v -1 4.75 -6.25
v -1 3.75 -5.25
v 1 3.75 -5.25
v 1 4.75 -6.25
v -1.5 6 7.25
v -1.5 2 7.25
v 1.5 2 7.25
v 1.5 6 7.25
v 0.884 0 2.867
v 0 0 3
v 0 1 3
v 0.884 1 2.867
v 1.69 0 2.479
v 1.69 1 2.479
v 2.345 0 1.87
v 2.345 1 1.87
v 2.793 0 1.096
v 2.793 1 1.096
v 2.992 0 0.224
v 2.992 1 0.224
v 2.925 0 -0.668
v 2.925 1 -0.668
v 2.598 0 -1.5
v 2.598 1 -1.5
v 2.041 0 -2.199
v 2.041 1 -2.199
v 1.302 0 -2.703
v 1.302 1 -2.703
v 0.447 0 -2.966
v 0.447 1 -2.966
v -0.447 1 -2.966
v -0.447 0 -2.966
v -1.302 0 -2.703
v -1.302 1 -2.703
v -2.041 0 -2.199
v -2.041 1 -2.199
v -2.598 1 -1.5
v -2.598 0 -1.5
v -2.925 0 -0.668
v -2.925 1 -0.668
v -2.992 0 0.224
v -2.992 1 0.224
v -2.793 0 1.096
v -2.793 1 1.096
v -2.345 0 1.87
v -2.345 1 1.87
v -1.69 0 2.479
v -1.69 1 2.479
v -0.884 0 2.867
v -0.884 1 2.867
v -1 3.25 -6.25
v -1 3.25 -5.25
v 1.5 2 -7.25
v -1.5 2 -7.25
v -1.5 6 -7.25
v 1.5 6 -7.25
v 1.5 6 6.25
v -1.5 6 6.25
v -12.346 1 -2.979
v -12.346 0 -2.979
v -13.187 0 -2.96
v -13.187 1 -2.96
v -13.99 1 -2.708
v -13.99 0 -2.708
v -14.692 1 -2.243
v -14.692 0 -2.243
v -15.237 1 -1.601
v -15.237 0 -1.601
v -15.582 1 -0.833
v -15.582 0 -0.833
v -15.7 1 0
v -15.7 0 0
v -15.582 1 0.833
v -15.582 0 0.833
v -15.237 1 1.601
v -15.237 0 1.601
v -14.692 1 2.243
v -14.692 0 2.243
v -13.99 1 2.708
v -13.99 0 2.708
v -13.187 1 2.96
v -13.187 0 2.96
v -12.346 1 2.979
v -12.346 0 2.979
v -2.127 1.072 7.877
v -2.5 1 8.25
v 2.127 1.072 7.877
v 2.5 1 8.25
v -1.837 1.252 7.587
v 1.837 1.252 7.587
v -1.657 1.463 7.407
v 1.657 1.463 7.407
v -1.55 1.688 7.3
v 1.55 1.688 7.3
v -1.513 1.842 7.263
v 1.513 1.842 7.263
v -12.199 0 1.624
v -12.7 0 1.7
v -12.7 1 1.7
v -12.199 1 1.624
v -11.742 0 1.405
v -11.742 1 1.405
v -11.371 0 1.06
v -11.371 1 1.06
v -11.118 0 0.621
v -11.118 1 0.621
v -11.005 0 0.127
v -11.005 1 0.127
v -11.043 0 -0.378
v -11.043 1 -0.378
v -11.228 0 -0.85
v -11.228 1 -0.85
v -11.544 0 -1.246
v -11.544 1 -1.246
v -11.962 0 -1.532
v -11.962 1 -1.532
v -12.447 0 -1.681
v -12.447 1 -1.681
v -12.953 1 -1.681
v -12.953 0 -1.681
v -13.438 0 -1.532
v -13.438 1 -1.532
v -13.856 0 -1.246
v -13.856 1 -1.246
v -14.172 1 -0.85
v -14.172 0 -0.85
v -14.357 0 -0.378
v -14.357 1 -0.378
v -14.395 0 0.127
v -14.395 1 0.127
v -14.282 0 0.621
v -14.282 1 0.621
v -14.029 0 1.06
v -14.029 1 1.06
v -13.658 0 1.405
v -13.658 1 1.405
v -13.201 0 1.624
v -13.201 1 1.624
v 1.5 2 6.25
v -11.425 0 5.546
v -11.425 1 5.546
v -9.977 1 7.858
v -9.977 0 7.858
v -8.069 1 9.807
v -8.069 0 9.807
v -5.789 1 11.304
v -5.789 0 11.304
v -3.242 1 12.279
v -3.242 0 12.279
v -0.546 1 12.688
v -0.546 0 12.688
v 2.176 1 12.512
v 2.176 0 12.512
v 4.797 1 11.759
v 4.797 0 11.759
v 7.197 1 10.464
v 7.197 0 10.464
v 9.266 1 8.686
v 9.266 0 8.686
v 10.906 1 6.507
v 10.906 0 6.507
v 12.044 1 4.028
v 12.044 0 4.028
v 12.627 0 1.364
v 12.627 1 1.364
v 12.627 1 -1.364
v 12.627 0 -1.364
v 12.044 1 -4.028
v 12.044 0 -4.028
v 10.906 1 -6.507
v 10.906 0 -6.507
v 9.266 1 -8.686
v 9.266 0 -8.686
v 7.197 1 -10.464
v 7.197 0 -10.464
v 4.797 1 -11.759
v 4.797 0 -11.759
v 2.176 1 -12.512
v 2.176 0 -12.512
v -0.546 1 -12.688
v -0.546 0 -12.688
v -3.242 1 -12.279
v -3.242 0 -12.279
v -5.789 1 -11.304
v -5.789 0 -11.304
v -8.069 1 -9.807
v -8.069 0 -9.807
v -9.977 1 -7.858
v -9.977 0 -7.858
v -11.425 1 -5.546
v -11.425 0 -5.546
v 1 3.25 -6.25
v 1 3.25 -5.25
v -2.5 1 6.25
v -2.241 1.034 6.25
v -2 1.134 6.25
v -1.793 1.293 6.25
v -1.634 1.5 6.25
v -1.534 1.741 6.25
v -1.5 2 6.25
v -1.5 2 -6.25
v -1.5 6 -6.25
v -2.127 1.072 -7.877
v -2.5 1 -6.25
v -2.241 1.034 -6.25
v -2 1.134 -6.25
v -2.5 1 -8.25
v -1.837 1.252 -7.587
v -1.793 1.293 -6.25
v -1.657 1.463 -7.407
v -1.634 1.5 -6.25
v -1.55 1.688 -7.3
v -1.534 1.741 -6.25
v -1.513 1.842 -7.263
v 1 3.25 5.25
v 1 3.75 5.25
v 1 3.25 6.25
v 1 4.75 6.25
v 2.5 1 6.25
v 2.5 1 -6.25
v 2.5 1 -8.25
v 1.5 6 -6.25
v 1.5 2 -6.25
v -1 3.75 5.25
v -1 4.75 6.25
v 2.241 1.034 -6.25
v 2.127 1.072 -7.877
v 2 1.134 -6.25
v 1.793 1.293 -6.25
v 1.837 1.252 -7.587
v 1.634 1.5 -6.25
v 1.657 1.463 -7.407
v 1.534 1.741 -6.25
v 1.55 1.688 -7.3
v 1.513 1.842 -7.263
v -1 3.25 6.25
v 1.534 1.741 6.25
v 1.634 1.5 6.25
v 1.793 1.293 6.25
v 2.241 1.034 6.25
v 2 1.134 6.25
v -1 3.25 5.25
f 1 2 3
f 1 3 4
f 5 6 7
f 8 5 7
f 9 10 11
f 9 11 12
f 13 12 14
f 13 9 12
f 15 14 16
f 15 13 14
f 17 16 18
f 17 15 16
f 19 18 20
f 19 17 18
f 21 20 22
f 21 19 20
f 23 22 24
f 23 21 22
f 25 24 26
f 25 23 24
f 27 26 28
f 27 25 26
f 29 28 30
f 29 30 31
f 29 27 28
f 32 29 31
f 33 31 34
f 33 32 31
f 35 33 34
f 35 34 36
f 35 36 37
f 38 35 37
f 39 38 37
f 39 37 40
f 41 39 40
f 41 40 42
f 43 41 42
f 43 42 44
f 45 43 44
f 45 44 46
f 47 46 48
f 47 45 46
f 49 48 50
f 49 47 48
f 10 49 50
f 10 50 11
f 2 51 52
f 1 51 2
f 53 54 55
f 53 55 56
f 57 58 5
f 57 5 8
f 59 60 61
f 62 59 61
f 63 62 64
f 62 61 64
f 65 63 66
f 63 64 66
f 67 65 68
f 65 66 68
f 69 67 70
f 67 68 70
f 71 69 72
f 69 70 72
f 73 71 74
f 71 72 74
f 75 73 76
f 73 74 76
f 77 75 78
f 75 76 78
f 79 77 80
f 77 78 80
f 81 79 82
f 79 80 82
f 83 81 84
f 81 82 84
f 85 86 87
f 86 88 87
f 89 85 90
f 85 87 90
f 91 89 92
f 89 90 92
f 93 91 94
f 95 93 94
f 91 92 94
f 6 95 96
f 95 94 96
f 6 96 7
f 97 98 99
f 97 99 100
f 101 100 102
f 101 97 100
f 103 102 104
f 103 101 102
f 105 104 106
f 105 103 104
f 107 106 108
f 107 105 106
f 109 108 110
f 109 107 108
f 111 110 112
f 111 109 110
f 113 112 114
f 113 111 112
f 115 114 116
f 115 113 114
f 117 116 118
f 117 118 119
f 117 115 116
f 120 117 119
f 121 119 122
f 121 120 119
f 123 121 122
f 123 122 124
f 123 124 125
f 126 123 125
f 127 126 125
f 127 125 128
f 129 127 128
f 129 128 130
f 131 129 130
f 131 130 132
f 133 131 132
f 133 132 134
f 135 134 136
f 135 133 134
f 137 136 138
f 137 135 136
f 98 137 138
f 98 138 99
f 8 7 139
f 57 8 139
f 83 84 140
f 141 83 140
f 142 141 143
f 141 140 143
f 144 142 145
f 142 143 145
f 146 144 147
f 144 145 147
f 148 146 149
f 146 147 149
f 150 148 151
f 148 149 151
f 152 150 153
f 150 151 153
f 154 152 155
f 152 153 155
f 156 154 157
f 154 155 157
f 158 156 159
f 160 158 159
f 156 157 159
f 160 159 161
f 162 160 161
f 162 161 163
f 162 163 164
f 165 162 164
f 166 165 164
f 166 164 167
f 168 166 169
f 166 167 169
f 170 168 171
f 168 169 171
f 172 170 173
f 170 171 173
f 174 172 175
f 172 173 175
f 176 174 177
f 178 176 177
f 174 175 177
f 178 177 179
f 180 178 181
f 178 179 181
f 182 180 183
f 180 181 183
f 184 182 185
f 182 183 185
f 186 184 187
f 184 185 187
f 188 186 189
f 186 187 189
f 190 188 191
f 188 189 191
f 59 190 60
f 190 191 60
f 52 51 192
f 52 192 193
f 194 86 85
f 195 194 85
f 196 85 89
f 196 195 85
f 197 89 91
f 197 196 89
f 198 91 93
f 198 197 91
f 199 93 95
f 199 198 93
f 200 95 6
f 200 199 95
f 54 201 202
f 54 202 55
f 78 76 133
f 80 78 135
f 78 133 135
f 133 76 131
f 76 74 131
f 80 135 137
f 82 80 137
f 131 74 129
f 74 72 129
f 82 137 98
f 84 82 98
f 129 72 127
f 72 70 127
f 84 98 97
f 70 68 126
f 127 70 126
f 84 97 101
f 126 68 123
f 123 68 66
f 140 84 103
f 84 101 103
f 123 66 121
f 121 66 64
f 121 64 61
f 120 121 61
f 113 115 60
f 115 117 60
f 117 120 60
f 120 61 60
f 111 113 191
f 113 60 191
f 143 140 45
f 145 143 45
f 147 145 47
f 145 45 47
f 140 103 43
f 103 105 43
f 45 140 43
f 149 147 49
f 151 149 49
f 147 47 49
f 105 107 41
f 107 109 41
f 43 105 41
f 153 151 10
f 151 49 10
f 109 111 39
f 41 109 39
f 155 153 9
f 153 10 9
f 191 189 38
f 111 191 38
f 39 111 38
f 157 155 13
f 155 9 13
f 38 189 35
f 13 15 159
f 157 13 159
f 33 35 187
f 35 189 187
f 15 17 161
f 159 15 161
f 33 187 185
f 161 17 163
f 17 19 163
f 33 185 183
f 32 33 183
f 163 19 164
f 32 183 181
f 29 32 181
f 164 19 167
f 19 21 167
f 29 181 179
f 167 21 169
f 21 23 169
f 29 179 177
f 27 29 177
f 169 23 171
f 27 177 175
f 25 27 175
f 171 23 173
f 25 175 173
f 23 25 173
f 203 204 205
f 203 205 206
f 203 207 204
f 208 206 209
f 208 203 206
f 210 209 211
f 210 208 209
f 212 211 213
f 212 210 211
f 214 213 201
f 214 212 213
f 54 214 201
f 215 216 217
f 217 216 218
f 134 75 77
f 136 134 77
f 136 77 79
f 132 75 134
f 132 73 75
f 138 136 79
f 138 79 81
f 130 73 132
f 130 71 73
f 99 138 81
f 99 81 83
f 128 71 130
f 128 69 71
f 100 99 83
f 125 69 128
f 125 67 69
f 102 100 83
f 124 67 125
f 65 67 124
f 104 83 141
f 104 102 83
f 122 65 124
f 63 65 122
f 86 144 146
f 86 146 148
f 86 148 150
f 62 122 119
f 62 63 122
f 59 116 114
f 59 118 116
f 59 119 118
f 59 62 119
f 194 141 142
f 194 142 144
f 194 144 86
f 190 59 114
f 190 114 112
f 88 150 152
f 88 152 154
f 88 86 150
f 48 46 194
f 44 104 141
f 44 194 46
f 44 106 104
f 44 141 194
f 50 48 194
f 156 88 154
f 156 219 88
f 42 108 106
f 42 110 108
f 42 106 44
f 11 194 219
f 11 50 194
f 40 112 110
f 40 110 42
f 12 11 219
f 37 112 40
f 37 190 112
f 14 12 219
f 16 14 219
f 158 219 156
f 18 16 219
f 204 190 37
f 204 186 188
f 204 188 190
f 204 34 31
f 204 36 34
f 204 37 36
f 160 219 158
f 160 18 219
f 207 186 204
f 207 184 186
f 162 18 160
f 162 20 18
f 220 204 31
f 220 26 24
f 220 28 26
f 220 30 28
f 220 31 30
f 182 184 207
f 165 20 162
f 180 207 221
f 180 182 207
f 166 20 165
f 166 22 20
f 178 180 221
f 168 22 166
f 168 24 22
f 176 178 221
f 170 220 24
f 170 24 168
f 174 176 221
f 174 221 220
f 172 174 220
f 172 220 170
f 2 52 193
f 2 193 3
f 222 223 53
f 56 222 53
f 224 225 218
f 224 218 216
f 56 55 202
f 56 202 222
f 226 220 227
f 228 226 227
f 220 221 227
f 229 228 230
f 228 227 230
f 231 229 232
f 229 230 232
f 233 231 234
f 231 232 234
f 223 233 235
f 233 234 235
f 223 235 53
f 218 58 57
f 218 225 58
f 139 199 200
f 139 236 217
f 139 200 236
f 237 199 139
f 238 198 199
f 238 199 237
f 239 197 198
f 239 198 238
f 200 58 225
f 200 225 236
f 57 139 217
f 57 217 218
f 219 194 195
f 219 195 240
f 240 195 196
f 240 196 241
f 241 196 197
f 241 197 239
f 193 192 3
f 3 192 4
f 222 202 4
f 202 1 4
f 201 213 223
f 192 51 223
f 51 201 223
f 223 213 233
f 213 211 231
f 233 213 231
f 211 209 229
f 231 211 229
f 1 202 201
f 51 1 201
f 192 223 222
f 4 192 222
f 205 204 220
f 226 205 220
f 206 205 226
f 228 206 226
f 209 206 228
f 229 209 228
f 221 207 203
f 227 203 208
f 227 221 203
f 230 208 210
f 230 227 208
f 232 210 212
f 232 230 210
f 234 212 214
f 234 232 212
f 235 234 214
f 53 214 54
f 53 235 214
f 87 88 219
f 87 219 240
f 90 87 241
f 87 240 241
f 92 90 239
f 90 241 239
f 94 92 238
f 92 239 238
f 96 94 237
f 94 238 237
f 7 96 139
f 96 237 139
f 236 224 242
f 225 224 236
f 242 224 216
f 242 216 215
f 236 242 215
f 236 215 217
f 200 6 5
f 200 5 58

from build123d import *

# Parameters (mm, degrees)
SKETCH2_R                = 3
SKETCH2_R_2              = 1.7
BOSS_EXTRUDE1_DEPTH      = 1
SKETCH3_W                = 3
SKETCH3_H                = 1
BOSS_EXTRUDE2_DEPTH      = 5
BOSS_EXTRUDE3_DEPTH      = 1
BOSS_EXTRUDE3_DEPTH_BACK = 1
FILLET1_R                = 1


with BuildPart() as part:
    # Sketch2 → Boss-Extrude1 (new body)
    with BuildSketch(Plane(origin=(0, 0, 0), x_dir=(1, 0, 0), z_dir=(0, 1, 0))):
        with BuildLine():
            ThreePointArc((-12.345669291, -2.979001468), (12.7, 0), (-12.345669291, 2.979001468))
            ThreePointArc((-12.345669291, 2.979001468), (-15.7, 0), (-12.345669291, -2.979001468))
        make_face()
        with Locations(Location((0, 0, 0), (0, 0, 270))):
            Circle(SKETCH2_R, mode=Mode.SUBTRACT)
        with Locations(Location((-12.7, 0, 0), (0, 0, 270))):
            Circle(SKETCH2_R_2, mode=Mode.SUBTRACT)
    extrude(amount=BOSS_EXTRUDE1_DEPTH)

    # Sketch3 → Boss-Extrude2 (add)
    with BuildSketch(Plane(origin=(0, 1, 0), x_dir=(1, 0, 0), z_dir=(0, 1, 0))):
        with Locations((0, 6.75)):
            Rectangle(SKETCH3_W, SKETCH3_H)
        with Locations((0, -6.75)):
            Rectangle(SKETCH3_W, SKETCH3_H)
    extrude(amount=BOSS_EXTRUDE2_DEPTH)

    # Sketch4 → Boss-Extrude3 (add, two sides: drawn at the far end of the back side and taken through both)
    with BuildSketch(Plane(origin=(0, 0, 0), x_dir=(0, 0, -1), z_dir=(1, 0, 0)).offset(-BOSS_EXTRUDE3_DEPTH_BACK)):
        Polygon((-6.25, 4.75), (-5.25, 3.75), (-5.25, 3.25), (-6.25, 3.25), align=None)
        Polygon((5.25, 3.75), (6.25, 4.75), (6.25, 3.25), (5.25, 3.25), align=None)
    extrude(amount=BOSS_EXTRUDE3_DEPTH + BOSS_EXTRUDE3_DEPTH_BACK)

    # Fillet1
    fillet1_edges = [part.edges().sort_by_distance(p)[0] for p in [
        (-1.5, 1, -6.75),
        (1.5, 1, -6.75),
        (0, 1, -7.25),
        (-1.5, 1, 6.75),
        (0, 1, 7.25),
        (1.5, 1, 6.75),
    ]]
    fillet(fillet1_edges, radius=FILLET1_R)


solid = part.part
